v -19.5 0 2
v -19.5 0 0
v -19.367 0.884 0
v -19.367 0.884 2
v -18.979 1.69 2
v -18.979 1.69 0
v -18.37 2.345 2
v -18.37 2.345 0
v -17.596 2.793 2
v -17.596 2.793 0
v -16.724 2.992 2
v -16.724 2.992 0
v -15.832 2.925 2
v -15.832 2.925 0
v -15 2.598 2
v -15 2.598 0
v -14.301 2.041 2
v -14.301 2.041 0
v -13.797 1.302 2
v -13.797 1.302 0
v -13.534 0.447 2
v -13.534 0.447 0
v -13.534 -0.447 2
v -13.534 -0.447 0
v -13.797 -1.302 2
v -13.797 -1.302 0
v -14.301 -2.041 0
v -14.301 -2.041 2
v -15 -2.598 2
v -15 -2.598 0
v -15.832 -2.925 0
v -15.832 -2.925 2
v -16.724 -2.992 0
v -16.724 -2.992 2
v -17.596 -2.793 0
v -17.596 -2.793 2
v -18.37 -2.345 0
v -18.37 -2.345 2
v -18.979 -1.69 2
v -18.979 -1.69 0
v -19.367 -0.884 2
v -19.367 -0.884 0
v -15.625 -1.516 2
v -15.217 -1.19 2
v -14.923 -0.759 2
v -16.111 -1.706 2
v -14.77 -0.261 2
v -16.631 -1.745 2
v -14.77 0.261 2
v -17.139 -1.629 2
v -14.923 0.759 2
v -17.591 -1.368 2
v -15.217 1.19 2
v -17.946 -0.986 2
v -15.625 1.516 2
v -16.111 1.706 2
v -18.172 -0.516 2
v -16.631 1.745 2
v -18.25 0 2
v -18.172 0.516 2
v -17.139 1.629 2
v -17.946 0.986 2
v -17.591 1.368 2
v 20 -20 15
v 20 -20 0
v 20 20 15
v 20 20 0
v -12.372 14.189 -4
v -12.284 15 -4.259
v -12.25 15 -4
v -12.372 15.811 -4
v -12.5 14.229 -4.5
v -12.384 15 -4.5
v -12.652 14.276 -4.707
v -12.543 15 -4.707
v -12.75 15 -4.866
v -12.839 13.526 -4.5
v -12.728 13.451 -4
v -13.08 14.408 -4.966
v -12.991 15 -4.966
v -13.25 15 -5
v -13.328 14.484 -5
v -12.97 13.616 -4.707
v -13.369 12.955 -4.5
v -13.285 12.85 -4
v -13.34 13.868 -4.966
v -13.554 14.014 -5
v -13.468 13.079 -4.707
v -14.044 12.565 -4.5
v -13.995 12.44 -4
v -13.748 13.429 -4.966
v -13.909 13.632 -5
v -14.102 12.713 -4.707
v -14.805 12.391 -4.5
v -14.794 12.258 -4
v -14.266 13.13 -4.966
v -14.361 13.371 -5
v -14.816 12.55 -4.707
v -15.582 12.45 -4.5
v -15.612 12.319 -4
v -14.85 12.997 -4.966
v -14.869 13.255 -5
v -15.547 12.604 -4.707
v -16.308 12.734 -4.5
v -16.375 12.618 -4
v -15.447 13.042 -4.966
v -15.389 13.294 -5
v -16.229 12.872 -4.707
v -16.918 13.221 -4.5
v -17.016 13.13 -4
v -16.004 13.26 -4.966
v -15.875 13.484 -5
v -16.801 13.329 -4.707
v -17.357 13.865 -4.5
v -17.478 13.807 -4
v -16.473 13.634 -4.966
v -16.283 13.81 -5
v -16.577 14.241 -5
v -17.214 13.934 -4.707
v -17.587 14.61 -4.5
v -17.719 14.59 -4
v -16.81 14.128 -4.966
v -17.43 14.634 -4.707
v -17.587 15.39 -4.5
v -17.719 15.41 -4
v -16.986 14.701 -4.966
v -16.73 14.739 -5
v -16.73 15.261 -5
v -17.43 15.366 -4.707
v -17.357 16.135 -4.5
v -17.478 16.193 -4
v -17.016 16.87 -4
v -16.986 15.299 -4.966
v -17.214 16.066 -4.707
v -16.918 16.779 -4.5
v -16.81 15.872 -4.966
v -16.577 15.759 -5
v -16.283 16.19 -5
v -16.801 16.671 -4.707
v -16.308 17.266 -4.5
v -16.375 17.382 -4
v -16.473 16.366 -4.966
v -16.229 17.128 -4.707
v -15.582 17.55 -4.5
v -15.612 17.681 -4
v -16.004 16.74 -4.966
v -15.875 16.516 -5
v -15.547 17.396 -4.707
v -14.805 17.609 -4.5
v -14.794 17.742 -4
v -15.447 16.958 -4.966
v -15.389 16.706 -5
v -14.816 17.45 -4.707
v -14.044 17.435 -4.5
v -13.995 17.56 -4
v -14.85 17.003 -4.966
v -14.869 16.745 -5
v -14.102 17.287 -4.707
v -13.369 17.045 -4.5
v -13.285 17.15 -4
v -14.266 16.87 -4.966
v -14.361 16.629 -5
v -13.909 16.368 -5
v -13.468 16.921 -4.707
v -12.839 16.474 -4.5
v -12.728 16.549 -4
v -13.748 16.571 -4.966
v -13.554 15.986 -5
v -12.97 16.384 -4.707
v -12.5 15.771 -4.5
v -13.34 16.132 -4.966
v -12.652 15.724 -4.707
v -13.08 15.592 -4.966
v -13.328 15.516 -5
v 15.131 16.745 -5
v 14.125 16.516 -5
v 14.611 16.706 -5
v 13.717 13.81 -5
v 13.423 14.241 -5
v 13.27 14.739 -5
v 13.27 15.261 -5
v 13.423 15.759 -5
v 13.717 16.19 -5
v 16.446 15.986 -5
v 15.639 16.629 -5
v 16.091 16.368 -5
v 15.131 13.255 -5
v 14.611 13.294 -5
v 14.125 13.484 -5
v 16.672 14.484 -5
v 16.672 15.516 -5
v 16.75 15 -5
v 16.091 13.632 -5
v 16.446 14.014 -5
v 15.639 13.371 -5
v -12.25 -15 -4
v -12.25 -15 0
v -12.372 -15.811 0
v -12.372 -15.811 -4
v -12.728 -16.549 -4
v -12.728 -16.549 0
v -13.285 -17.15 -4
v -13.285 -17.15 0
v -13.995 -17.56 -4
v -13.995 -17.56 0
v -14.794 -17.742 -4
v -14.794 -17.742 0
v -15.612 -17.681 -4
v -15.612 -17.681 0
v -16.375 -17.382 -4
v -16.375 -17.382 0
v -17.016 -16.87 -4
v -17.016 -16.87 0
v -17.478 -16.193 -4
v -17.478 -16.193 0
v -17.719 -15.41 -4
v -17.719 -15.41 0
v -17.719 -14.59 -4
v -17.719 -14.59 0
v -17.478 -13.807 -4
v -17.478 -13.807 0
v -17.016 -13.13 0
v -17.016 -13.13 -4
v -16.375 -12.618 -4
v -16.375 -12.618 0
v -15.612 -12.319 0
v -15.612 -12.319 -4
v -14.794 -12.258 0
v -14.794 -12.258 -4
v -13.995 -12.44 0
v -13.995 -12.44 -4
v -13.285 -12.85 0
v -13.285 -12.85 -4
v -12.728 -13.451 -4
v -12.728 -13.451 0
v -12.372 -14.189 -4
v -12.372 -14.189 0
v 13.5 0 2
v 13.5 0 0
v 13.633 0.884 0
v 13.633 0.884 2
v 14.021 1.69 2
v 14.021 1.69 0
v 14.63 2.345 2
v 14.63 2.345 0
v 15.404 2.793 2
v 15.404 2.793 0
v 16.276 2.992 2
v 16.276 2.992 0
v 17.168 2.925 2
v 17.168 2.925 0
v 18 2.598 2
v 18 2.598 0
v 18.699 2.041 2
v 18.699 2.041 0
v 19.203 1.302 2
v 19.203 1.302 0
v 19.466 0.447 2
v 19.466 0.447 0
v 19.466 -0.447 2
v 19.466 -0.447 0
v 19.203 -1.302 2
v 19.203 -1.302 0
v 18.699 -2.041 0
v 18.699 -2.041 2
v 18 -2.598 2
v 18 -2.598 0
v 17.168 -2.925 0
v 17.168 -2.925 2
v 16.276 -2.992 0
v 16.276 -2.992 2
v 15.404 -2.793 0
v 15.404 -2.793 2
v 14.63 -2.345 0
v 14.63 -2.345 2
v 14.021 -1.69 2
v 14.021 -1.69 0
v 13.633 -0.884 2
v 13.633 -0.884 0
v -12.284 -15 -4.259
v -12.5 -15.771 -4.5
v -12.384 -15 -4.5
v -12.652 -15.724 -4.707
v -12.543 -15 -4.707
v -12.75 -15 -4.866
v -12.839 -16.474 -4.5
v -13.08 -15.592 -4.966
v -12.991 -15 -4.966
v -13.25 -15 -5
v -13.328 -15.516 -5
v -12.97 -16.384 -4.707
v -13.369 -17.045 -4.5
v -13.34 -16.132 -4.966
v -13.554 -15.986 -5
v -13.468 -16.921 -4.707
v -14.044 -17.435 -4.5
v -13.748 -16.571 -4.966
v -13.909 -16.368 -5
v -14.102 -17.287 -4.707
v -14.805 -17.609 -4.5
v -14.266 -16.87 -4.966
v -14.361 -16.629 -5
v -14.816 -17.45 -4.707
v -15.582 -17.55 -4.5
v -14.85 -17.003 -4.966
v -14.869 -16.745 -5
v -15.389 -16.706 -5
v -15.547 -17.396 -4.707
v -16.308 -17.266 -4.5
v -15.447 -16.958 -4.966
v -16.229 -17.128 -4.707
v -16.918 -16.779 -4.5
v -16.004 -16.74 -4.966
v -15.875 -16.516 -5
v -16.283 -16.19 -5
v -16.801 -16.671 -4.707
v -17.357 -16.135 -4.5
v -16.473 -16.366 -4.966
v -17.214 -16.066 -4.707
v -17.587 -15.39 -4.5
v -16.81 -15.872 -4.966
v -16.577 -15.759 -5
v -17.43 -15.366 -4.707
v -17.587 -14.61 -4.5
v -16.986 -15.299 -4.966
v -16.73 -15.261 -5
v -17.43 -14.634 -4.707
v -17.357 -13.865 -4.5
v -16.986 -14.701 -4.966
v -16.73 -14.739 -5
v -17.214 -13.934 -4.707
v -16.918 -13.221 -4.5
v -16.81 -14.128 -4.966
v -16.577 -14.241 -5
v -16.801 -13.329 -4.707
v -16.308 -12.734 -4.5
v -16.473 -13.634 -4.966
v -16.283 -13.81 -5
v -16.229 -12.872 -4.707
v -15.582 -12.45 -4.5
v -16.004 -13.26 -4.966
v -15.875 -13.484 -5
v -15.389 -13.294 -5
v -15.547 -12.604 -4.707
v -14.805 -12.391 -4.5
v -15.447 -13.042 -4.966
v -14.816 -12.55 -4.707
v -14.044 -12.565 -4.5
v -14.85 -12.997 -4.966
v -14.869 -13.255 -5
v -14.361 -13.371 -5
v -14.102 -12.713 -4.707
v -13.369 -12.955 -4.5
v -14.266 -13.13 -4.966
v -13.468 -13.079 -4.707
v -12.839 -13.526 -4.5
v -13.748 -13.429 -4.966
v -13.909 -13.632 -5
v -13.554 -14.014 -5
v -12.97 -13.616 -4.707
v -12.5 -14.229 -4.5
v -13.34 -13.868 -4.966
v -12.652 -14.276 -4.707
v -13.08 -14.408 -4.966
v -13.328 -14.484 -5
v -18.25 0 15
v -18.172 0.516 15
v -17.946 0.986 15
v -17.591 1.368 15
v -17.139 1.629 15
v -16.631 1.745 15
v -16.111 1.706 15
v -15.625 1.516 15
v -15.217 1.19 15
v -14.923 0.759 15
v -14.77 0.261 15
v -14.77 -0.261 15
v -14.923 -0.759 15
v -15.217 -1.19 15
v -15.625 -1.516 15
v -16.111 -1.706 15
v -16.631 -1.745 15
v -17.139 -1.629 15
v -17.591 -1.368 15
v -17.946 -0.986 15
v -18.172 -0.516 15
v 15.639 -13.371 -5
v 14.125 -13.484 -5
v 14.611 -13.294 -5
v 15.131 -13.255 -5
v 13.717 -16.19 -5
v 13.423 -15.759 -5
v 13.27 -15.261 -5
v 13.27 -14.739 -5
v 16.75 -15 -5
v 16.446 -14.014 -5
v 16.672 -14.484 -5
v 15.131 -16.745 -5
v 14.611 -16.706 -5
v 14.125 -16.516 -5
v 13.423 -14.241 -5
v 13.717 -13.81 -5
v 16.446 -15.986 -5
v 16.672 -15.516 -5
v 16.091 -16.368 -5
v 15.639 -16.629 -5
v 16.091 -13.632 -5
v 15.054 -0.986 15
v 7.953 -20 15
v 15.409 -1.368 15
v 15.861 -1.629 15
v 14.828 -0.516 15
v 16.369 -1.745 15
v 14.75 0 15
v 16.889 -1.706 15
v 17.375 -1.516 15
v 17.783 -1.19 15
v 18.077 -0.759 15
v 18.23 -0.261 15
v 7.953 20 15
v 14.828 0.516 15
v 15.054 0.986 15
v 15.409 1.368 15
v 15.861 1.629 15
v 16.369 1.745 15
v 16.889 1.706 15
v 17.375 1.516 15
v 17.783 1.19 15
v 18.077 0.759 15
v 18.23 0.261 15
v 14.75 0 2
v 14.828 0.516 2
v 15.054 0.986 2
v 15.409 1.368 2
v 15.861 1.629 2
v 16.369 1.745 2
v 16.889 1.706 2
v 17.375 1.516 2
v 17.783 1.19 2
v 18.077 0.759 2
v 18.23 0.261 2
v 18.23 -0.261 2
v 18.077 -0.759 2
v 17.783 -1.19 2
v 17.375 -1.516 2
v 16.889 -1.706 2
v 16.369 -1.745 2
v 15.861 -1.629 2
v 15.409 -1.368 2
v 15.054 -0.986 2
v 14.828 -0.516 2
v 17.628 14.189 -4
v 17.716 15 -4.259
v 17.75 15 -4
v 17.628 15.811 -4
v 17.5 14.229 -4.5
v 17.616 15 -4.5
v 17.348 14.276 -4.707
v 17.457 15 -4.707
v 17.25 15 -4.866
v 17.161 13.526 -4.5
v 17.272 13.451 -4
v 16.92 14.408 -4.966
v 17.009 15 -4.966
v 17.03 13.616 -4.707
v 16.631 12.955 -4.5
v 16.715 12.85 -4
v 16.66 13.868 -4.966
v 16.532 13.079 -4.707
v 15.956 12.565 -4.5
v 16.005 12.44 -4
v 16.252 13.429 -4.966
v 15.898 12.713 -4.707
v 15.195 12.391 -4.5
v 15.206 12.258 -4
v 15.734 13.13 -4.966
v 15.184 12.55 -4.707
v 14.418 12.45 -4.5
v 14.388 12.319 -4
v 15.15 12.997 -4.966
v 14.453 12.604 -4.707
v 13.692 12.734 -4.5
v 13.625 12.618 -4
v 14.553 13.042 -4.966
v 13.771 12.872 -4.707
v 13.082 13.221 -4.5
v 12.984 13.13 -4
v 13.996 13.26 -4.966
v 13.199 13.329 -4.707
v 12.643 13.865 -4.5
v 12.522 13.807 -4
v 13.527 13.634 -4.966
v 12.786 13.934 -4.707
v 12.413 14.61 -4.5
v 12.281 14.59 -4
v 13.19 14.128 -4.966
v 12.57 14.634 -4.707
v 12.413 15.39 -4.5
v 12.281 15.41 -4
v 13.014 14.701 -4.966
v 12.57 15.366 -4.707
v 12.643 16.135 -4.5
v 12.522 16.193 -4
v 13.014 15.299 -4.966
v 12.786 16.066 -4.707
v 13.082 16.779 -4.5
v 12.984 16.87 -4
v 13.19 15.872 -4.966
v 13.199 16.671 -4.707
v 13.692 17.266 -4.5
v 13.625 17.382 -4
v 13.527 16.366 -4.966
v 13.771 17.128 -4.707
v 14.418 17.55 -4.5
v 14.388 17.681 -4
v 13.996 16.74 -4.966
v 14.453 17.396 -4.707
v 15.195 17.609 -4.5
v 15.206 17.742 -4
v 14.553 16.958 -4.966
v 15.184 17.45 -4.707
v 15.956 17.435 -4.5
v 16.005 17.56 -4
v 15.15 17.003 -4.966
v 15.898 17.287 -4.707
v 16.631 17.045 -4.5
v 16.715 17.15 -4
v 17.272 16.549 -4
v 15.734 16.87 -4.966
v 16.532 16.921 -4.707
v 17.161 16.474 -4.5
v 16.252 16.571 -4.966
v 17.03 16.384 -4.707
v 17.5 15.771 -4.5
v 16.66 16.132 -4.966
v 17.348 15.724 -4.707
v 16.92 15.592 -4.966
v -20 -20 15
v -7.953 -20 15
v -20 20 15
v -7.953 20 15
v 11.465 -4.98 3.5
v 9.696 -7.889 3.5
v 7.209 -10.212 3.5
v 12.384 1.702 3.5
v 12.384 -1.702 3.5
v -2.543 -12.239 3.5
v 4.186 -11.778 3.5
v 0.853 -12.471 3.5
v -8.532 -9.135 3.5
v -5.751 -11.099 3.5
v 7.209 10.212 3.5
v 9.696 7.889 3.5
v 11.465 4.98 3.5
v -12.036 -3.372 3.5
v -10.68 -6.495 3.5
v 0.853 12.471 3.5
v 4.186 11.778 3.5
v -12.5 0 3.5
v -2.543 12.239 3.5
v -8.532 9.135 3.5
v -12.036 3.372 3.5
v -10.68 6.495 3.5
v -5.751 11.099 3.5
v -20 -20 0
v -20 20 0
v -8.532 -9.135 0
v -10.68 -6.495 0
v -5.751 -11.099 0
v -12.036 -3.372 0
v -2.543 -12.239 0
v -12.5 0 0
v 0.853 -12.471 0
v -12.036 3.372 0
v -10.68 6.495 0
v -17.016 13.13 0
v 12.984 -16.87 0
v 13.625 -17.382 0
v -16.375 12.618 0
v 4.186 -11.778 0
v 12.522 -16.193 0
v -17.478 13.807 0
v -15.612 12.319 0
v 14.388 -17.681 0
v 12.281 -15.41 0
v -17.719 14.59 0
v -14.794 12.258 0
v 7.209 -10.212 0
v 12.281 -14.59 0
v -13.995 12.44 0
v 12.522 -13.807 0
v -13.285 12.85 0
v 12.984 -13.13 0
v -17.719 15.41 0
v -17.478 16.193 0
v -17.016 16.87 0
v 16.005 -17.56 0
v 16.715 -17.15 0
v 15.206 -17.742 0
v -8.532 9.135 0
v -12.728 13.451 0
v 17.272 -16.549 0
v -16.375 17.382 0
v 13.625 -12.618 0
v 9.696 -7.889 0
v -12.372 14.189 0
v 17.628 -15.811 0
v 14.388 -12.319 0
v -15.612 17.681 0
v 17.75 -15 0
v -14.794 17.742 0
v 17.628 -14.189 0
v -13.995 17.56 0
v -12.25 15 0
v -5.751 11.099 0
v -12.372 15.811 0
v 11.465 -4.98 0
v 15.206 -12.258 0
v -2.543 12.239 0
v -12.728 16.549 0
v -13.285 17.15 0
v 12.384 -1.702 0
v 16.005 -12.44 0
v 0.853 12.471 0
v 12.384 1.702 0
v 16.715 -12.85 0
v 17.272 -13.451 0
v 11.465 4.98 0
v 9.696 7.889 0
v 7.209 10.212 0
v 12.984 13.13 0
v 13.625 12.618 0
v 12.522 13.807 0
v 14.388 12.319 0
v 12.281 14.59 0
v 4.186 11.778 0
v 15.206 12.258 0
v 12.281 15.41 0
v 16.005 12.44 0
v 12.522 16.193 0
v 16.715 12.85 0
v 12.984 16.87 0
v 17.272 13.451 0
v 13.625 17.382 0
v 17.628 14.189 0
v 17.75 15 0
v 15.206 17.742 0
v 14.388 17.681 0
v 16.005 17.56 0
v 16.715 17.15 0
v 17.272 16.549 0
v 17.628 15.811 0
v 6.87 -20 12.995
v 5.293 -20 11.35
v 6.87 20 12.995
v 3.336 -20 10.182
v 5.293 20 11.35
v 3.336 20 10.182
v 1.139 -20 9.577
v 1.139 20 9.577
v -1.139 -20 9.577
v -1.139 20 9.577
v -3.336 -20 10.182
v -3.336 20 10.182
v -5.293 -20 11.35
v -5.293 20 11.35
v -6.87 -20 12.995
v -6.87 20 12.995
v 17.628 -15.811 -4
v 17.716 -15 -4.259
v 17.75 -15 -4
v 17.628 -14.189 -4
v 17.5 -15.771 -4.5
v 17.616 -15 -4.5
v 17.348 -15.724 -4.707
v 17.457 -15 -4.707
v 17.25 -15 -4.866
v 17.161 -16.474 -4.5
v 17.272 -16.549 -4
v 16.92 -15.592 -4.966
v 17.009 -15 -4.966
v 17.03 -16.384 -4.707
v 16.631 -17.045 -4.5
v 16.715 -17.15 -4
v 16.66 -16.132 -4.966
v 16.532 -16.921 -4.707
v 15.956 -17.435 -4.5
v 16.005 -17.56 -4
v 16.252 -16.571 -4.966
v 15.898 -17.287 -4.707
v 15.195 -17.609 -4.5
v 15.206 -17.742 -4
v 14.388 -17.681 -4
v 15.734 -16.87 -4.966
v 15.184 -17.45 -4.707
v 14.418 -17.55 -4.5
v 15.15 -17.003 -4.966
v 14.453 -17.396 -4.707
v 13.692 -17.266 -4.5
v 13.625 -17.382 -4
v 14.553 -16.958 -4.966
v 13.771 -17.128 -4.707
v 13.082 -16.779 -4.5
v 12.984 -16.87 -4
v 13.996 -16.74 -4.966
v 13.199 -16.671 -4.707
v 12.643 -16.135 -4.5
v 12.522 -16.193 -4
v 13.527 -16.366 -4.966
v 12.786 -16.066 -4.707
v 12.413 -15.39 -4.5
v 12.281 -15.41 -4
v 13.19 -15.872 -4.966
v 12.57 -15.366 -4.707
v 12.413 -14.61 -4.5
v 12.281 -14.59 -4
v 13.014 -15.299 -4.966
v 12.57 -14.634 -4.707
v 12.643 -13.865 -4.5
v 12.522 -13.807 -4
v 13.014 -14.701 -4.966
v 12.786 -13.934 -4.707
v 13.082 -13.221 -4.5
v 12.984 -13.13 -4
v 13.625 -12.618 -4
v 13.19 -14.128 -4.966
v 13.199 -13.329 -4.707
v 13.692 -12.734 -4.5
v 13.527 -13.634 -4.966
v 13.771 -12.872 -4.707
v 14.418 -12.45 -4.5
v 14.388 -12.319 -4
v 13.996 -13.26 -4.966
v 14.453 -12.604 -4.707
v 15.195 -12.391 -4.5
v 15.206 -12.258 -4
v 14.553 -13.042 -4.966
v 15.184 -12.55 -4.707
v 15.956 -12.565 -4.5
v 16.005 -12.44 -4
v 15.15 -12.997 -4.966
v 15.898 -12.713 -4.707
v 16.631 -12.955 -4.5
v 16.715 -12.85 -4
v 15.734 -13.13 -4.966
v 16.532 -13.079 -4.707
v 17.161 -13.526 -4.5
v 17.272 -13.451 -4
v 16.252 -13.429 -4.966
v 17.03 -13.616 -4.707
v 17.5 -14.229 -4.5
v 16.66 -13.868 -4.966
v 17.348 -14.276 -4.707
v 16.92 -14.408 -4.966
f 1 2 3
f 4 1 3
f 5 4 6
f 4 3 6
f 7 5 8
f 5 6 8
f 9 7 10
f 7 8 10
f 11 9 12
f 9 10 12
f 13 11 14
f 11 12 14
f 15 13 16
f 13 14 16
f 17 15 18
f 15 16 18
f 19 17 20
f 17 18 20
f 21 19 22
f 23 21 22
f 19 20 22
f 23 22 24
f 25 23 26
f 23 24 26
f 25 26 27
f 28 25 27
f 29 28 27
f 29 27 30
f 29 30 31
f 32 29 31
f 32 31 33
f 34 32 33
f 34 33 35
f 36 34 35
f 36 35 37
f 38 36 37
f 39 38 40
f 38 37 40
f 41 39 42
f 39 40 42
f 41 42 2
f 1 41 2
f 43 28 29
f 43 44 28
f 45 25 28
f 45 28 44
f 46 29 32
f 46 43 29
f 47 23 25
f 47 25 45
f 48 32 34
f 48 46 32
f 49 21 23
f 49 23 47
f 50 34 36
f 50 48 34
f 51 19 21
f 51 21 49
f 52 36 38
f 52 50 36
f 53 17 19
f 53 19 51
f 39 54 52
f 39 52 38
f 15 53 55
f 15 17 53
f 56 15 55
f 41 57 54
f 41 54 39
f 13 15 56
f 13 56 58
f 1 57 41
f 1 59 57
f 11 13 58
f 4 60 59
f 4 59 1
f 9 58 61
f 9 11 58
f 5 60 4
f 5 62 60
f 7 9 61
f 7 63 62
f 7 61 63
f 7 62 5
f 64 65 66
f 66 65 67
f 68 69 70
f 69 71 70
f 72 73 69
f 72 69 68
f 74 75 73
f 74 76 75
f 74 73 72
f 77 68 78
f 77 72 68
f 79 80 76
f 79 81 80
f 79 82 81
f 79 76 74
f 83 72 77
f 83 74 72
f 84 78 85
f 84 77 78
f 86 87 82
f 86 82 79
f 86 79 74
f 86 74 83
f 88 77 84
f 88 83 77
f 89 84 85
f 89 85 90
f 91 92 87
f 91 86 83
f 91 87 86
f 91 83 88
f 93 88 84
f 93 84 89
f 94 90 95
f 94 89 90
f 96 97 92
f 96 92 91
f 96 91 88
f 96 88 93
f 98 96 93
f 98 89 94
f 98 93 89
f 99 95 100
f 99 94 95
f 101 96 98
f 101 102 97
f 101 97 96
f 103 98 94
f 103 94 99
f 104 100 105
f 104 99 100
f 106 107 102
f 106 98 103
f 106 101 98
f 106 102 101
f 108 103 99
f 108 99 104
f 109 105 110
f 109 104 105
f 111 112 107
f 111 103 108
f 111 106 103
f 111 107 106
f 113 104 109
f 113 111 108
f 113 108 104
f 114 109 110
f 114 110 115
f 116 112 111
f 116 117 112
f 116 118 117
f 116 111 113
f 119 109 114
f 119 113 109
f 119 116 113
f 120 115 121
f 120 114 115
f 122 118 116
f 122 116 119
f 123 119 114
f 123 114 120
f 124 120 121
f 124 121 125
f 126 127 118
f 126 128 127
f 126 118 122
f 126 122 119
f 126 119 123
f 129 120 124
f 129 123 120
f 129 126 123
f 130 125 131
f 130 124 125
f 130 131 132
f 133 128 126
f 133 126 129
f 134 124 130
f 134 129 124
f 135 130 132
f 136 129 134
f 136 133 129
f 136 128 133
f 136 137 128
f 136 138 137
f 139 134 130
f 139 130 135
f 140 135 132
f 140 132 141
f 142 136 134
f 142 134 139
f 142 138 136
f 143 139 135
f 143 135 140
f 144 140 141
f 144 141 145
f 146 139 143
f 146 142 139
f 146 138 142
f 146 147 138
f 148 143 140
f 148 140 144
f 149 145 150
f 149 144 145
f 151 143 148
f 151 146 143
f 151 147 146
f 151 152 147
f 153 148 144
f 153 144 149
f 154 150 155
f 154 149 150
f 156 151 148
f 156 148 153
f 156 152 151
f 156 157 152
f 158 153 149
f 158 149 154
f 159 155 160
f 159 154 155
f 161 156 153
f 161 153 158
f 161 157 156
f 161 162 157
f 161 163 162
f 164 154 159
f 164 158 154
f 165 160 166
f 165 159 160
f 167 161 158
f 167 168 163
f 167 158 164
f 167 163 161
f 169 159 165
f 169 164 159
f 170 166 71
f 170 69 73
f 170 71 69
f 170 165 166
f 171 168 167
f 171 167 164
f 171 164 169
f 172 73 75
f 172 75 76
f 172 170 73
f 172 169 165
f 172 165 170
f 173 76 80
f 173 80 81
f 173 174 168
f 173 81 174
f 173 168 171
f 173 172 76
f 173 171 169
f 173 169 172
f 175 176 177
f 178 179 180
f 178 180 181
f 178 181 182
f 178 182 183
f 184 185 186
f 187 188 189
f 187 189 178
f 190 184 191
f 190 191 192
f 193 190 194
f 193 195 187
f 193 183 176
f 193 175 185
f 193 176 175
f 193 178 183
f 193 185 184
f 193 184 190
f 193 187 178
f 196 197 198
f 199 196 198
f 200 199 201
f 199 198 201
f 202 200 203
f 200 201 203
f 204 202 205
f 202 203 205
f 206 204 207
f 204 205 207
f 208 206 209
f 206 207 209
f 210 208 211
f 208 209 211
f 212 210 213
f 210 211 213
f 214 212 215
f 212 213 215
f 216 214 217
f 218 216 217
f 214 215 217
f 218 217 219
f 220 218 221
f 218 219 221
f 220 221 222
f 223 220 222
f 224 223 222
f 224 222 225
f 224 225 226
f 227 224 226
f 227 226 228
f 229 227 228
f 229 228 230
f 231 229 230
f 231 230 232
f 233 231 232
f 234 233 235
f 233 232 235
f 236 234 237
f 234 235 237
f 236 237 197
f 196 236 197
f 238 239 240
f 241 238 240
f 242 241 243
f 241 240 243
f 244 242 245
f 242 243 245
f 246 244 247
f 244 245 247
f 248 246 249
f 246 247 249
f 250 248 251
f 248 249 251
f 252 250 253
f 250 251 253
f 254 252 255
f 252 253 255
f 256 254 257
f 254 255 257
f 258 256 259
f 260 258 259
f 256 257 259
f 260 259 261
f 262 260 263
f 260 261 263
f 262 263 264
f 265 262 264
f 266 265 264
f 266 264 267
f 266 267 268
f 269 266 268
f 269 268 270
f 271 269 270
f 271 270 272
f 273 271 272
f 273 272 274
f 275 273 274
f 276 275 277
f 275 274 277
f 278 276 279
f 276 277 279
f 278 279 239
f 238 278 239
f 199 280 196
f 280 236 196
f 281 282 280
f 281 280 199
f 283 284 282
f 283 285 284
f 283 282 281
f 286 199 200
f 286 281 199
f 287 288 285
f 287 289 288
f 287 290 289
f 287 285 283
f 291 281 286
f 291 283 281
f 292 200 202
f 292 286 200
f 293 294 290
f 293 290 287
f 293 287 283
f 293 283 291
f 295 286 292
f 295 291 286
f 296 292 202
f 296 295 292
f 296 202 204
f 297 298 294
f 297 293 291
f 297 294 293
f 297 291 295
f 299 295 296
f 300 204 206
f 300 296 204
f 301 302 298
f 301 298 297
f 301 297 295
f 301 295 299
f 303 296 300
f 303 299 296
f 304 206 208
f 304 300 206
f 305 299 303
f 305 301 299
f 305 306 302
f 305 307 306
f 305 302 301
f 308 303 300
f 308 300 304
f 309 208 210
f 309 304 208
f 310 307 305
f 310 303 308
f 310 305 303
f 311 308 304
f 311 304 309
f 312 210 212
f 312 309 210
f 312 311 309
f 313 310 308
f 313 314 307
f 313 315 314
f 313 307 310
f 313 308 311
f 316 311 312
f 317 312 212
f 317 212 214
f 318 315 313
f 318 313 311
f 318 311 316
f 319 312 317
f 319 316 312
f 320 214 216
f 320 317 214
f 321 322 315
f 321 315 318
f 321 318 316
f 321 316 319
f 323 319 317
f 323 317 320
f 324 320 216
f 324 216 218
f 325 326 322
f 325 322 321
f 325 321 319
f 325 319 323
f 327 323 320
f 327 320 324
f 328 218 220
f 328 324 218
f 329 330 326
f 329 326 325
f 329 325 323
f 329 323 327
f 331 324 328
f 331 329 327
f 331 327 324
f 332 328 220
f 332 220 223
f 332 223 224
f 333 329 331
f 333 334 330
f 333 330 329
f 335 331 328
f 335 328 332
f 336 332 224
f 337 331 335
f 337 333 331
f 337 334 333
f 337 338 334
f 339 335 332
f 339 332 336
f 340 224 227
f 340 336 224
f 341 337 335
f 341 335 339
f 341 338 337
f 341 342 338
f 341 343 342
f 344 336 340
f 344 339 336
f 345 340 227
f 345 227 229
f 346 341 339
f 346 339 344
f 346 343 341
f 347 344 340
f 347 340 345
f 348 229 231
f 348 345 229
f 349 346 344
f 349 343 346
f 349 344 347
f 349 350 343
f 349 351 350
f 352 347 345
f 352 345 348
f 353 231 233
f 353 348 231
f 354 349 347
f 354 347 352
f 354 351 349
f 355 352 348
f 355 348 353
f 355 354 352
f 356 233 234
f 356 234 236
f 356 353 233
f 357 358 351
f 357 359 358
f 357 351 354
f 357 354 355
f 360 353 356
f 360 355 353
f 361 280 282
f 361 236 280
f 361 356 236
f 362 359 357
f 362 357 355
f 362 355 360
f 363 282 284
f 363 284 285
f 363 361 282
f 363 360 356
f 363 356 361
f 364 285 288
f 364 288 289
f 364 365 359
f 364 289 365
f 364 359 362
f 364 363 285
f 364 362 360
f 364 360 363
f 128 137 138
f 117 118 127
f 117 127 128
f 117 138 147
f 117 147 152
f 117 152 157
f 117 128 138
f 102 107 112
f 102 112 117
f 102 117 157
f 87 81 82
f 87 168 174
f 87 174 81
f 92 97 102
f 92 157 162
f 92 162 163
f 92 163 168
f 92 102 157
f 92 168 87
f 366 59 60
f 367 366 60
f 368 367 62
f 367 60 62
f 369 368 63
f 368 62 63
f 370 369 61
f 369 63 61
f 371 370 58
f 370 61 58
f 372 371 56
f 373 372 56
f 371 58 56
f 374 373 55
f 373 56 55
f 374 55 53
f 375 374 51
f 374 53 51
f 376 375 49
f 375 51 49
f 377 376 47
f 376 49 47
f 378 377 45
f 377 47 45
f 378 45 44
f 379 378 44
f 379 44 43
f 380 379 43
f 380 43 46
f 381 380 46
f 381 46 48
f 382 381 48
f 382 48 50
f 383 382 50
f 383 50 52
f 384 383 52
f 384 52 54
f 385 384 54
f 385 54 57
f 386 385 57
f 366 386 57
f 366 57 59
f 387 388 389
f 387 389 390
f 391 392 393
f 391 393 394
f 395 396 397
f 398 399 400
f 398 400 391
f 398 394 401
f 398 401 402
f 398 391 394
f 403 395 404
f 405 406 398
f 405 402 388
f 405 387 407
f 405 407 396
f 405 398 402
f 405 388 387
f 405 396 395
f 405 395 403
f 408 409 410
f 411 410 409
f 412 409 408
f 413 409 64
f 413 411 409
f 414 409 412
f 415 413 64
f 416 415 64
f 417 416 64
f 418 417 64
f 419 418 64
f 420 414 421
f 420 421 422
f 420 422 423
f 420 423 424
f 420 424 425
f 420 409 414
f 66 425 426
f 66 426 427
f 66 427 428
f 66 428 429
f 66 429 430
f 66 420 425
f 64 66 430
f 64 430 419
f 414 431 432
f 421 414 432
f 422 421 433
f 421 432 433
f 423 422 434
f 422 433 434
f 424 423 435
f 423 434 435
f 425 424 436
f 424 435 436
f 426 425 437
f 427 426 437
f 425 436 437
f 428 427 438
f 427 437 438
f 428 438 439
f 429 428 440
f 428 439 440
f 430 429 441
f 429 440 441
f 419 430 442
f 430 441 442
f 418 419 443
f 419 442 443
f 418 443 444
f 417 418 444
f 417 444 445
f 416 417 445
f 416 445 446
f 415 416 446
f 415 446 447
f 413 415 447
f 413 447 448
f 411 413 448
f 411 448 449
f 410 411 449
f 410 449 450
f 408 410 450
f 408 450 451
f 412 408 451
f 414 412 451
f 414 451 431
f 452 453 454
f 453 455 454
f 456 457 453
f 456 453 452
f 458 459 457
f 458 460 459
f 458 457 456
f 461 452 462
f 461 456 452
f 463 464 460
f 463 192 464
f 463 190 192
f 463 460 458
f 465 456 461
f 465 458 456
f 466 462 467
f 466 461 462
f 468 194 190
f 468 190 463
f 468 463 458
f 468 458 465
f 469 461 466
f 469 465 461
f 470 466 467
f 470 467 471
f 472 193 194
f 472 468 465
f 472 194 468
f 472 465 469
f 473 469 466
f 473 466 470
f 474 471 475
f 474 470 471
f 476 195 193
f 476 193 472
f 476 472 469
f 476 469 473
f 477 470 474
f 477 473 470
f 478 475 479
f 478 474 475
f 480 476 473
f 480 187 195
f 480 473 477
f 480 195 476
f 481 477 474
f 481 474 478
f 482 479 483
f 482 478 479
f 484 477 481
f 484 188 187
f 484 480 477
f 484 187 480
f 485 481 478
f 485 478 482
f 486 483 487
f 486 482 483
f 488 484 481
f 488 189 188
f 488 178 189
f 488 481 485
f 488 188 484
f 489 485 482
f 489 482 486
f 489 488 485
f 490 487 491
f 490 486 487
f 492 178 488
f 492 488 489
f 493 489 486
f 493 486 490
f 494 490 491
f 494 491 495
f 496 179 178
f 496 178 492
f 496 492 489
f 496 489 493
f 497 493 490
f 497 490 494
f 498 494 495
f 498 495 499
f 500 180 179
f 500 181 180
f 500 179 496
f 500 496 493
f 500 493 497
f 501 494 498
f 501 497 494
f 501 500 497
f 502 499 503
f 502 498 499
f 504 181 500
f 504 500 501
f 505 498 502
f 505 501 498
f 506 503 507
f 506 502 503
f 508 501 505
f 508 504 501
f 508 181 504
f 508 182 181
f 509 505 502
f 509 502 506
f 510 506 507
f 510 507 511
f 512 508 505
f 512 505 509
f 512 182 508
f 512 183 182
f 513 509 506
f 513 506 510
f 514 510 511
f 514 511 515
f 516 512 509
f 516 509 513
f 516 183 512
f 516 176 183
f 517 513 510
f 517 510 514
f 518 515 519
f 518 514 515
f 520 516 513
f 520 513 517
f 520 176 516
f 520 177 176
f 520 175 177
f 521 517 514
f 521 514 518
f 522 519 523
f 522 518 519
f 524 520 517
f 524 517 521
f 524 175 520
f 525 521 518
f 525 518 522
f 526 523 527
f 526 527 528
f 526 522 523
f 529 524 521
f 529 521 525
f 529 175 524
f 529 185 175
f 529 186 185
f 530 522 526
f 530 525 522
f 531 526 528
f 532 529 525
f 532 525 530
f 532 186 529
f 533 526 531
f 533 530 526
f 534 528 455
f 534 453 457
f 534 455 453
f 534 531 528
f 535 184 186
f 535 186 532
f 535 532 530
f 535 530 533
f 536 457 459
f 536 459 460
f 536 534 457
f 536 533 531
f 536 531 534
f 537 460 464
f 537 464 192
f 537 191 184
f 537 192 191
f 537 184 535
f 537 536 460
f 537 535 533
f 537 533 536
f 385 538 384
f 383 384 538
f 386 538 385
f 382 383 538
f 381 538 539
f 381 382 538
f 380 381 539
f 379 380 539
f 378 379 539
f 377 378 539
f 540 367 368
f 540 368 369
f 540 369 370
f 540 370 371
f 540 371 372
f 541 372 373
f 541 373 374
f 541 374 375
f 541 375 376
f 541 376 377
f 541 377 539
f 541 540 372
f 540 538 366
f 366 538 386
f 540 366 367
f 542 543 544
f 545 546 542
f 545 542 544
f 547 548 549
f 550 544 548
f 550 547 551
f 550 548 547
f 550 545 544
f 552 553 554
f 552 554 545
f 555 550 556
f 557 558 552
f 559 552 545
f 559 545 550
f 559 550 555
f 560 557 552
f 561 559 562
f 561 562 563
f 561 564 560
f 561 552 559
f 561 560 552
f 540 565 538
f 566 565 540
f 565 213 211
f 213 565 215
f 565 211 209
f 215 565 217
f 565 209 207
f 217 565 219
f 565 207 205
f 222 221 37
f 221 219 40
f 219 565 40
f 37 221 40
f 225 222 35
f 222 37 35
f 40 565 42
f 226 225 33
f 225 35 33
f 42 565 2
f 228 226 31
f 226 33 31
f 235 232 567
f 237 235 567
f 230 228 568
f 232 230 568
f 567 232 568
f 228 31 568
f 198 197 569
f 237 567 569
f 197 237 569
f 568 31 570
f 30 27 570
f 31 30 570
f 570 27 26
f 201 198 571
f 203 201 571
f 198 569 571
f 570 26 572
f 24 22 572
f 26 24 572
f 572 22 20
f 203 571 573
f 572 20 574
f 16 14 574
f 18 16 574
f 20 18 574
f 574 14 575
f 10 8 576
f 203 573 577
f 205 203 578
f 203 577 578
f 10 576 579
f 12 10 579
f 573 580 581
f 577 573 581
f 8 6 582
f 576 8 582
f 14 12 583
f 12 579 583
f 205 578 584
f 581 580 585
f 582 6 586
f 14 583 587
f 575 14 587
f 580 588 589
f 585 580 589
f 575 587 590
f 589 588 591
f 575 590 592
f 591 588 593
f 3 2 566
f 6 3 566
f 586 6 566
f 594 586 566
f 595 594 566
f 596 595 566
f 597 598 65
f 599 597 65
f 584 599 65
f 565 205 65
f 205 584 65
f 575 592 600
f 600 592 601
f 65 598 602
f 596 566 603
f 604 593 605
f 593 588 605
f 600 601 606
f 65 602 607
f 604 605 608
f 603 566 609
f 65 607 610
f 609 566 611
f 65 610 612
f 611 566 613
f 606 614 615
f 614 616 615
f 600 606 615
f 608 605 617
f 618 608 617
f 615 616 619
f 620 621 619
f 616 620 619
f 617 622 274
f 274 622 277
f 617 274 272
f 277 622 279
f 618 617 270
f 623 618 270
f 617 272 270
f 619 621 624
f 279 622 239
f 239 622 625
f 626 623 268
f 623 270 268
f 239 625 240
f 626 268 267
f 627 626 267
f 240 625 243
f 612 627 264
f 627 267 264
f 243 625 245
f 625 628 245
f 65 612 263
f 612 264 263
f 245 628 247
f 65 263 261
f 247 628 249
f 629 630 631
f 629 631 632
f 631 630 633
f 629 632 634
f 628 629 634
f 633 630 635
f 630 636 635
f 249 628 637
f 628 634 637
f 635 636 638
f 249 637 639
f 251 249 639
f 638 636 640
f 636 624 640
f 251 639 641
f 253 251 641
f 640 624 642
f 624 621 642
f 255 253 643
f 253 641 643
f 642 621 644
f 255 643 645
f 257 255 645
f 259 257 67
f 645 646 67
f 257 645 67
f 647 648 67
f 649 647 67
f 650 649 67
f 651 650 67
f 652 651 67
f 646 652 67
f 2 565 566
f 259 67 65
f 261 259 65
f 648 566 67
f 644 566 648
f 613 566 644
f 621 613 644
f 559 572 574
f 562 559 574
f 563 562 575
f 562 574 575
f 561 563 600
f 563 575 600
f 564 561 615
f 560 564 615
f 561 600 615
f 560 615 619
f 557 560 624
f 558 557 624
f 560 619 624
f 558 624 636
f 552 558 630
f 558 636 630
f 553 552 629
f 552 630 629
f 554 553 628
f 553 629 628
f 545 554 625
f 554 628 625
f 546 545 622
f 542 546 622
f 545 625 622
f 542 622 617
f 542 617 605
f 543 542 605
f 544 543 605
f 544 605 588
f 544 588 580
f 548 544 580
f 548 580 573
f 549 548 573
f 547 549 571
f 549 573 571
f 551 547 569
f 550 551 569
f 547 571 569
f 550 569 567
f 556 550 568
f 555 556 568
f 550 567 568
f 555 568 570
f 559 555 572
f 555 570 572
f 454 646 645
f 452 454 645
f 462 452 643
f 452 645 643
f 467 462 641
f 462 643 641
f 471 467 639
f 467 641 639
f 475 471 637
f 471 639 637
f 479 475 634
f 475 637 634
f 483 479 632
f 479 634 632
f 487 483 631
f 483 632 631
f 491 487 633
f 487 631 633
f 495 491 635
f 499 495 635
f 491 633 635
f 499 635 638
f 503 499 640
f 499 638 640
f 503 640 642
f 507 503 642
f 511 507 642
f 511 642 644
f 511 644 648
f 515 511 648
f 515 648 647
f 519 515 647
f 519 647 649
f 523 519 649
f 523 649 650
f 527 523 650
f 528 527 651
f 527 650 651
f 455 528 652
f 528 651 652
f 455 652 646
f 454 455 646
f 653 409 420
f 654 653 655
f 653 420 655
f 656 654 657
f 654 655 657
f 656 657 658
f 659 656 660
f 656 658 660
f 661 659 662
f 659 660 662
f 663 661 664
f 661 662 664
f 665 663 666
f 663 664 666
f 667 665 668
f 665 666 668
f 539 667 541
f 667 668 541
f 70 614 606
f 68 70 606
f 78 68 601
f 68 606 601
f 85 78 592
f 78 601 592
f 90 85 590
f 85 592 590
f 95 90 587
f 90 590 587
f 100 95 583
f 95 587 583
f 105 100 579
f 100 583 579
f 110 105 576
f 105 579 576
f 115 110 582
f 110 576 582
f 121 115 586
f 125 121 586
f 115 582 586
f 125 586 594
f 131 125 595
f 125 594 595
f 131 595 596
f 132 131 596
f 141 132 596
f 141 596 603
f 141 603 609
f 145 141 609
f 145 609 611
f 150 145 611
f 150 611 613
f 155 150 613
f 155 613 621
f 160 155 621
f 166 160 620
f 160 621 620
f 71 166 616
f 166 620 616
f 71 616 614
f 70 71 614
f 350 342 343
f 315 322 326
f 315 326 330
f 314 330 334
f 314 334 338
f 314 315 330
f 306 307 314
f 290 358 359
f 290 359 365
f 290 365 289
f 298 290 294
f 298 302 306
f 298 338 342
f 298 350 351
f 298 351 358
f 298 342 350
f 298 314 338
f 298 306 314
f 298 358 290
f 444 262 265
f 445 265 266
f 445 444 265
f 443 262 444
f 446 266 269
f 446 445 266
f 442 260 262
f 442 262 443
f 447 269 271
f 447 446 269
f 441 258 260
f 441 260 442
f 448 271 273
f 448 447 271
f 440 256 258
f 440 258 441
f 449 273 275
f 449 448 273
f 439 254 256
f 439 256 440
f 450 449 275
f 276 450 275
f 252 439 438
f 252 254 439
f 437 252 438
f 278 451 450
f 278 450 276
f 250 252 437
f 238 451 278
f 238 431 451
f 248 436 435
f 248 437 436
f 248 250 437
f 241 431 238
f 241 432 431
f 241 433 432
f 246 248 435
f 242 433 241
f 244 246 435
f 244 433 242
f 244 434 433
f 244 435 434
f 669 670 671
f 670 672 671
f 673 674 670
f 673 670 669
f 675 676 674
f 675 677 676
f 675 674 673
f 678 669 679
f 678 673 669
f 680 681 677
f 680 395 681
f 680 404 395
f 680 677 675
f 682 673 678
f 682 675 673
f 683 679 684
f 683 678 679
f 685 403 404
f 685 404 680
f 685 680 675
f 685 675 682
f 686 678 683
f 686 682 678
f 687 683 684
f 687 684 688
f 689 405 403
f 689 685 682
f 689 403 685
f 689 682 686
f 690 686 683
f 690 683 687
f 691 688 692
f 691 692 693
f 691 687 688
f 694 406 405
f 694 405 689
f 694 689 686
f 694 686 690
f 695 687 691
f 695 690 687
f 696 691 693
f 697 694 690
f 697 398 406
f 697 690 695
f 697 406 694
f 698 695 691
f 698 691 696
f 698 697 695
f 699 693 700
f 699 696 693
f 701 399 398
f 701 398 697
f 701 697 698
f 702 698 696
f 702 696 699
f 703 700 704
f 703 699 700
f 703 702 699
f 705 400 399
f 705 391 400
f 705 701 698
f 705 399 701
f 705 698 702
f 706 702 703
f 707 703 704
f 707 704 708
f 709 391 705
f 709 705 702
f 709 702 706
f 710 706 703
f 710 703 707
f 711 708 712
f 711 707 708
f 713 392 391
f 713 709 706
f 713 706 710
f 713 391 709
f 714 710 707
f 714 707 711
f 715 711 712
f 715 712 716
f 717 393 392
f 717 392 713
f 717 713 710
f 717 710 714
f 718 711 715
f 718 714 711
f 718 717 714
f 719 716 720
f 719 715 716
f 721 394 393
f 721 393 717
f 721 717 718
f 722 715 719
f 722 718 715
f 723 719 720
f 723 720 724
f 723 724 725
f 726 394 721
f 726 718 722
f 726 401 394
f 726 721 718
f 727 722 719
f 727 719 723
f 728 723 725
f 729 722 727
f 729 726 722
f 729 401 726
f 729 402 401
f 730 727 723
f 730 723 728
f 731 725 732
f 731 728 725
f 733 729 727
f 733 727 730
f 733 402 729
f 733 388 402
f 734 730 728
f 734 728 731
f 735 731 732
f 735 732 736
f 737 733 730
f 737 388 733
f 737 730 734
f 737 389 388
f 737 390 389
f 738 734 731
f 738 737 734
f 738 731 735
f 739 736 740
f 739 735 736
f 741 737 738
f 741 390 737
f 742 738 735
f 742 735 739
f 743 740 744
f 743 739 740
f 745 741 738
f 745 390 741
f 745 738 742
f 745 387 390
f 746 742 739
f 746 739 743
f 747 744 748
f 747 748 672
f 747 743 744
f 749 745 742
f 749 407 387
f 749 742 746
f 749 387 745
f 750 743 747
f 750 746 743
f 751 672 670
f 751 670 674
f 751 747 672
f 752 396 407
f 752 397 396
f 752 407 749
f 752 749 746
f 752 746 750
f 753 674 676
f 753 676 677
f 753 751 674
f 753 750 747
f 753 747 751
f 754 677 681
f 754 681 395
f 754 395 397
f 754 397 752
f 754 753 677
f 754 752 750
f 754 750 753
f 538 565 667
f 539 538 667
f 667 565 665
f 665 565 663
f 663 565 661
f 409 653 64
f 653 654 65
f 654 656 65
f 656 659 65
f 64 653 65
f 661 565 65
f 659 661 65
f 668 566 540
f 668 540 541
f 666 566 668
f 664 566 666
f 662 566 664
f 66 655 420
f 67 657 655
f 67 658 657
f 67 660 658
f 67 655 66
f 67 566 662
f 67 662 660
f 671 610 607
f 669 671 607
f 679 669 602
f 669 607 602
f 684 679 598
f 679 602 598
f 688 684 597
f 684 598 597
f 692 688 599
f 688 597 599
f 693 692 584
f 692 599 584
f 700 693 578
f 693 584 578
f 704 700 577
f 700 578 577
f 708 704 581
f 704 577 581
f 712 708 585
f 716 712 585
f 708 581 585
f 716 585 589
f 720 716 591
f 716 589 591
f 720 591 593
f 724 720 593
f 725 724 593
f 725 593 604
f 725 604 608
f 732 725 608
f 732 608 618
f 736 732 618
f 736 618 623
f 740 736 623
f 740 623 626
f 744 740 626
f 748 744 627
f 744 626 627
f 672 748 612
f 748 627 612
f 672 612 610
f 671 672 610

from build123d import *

# Parameters (mm, degrees)
SKETCH1_W           = 40
SKETCH1_H           = 40
BOSS_EXTRUDE1_DEPTH = 15
SKETCH3_R           = 2.75
BOSS_EXTRUDE2_DEPTH = 5
FILLET1_R           = 1
SKETCH4_R           = 12.5
CUT_EXTRUDE1_DEPTH  = 3.5
SKETCH5_R           = 8.5
CUT_EXTRUDE2_DEPTH  = 41
SKETCH6_R           = 3
CUT_EXTRUDE3_DEPTH  = 2
SKETCH7_R           = 1.75
CUT_EXTRUDE4_DEPTH  = 16


with BuildPart() as part:
    # Sketch1 → Boss-Extrude1 (new body)
    with BuildSketch(Plane.XY):
        Rectangle(SKETCH1_W, SKETCH1_H)
    extrude(amount=BOSS_EXTRUDE1_DEPTH)

    # Sketch3 → Boss-Extrude2 (add)
    with BuildSketch(Plane(origin=(0, 0, 0), x_dir=(-1, 0, 0), z_dir=(0, 0, -1))):
        with Locations(Location((-15, 15, 0), (0, 0, 180))):  # turned: the seam where the file's is
            Circle(SKETCH3_R)
        with Locations(Location((15, 15, 0), (0, 0, 180))):  # turned: the seam where the file's is
            Circle(SKETCH3_R)
        with Locations(Location((-15, -15, 0), (0, 0, 180))):  # turned: the seam where the file's is
            Circle(SKETCH3_R)
        with Locations(Location((15, -15, 0), (0, 0, 180))):  # turned: the seam where the file's is
            Circle(SKETCH3_R)
    extrude(amount=BOSS_EXTRUDE2_DEPTH)

    # Fillet1
    fillet1_edges = [part.edges().sort_by_distance(p)[0] for p in [
        (12.25, 15, -5),
        (-17.75, 15, -5),
        (12.25, -15, -5),
        (-17.75, -15, -5),
    ]]
    fillet(fillet1_edges, radius=FILLET1_R)

    # Sketch4 → Cut-Extrude1 (cut)
    with BuildSketch(Plane(origin=(0, 0, 0), x_dir=(-1, 0, 0), z_dir=(0, 0, -1))):
        Circle(SKETCH4_R)
    extrude(amount=-CUT_EXTRUDE1_DEPTH, mode=Mode.SUBTRACT)

    # Sketch5 → Cut-Extrude2 (cut, through all)
    with BuildSketch(Plane(origin=(0, 20, 0), x_dir=(1, 0, 0), z_dir=(0, 1, 0))):
        with Locations((0, -18)):
            Circle(SKETCH5_R)
    extrude(amount=-CUT_EXTRUDE2_DEPTH, mode=Mode.SUBTRACT)

    # Sketch6 → Cut-Extrude3 (cut)
    with BuildSketch(Plane(origin=(0, 0, 0), x_dir=(-1, 0, 0), z_dir=(0, 0, -1))):
        with Locations((-16.5, 0)):
            Circle(SKETCH6_R)
        with Locations((16.5, 0)):
            Circle(SKETCH6_R)
    extrude(amount=-CUT_EXTRUDE3_DEPTH, mode=Mode.SUBTRACT)

    # Sketch7 → Cut-Extrude4 (cut, through all)
    with BuildSketch(Plane(origin=(0, 0, 0), x_dir=(-1, 0, 0), z_dir=(0, 0, -1))):
        with Locations((16.5, 0)):
            Circle(SKETCH7_R)
        with Locations((-16.5, 0)):
            Circle(SKETCH7_R)
    extrude(amount=-CUT_EXTRUDE4_DEPTH, mode=Mode.SUBTRACT)


solid = part.part
